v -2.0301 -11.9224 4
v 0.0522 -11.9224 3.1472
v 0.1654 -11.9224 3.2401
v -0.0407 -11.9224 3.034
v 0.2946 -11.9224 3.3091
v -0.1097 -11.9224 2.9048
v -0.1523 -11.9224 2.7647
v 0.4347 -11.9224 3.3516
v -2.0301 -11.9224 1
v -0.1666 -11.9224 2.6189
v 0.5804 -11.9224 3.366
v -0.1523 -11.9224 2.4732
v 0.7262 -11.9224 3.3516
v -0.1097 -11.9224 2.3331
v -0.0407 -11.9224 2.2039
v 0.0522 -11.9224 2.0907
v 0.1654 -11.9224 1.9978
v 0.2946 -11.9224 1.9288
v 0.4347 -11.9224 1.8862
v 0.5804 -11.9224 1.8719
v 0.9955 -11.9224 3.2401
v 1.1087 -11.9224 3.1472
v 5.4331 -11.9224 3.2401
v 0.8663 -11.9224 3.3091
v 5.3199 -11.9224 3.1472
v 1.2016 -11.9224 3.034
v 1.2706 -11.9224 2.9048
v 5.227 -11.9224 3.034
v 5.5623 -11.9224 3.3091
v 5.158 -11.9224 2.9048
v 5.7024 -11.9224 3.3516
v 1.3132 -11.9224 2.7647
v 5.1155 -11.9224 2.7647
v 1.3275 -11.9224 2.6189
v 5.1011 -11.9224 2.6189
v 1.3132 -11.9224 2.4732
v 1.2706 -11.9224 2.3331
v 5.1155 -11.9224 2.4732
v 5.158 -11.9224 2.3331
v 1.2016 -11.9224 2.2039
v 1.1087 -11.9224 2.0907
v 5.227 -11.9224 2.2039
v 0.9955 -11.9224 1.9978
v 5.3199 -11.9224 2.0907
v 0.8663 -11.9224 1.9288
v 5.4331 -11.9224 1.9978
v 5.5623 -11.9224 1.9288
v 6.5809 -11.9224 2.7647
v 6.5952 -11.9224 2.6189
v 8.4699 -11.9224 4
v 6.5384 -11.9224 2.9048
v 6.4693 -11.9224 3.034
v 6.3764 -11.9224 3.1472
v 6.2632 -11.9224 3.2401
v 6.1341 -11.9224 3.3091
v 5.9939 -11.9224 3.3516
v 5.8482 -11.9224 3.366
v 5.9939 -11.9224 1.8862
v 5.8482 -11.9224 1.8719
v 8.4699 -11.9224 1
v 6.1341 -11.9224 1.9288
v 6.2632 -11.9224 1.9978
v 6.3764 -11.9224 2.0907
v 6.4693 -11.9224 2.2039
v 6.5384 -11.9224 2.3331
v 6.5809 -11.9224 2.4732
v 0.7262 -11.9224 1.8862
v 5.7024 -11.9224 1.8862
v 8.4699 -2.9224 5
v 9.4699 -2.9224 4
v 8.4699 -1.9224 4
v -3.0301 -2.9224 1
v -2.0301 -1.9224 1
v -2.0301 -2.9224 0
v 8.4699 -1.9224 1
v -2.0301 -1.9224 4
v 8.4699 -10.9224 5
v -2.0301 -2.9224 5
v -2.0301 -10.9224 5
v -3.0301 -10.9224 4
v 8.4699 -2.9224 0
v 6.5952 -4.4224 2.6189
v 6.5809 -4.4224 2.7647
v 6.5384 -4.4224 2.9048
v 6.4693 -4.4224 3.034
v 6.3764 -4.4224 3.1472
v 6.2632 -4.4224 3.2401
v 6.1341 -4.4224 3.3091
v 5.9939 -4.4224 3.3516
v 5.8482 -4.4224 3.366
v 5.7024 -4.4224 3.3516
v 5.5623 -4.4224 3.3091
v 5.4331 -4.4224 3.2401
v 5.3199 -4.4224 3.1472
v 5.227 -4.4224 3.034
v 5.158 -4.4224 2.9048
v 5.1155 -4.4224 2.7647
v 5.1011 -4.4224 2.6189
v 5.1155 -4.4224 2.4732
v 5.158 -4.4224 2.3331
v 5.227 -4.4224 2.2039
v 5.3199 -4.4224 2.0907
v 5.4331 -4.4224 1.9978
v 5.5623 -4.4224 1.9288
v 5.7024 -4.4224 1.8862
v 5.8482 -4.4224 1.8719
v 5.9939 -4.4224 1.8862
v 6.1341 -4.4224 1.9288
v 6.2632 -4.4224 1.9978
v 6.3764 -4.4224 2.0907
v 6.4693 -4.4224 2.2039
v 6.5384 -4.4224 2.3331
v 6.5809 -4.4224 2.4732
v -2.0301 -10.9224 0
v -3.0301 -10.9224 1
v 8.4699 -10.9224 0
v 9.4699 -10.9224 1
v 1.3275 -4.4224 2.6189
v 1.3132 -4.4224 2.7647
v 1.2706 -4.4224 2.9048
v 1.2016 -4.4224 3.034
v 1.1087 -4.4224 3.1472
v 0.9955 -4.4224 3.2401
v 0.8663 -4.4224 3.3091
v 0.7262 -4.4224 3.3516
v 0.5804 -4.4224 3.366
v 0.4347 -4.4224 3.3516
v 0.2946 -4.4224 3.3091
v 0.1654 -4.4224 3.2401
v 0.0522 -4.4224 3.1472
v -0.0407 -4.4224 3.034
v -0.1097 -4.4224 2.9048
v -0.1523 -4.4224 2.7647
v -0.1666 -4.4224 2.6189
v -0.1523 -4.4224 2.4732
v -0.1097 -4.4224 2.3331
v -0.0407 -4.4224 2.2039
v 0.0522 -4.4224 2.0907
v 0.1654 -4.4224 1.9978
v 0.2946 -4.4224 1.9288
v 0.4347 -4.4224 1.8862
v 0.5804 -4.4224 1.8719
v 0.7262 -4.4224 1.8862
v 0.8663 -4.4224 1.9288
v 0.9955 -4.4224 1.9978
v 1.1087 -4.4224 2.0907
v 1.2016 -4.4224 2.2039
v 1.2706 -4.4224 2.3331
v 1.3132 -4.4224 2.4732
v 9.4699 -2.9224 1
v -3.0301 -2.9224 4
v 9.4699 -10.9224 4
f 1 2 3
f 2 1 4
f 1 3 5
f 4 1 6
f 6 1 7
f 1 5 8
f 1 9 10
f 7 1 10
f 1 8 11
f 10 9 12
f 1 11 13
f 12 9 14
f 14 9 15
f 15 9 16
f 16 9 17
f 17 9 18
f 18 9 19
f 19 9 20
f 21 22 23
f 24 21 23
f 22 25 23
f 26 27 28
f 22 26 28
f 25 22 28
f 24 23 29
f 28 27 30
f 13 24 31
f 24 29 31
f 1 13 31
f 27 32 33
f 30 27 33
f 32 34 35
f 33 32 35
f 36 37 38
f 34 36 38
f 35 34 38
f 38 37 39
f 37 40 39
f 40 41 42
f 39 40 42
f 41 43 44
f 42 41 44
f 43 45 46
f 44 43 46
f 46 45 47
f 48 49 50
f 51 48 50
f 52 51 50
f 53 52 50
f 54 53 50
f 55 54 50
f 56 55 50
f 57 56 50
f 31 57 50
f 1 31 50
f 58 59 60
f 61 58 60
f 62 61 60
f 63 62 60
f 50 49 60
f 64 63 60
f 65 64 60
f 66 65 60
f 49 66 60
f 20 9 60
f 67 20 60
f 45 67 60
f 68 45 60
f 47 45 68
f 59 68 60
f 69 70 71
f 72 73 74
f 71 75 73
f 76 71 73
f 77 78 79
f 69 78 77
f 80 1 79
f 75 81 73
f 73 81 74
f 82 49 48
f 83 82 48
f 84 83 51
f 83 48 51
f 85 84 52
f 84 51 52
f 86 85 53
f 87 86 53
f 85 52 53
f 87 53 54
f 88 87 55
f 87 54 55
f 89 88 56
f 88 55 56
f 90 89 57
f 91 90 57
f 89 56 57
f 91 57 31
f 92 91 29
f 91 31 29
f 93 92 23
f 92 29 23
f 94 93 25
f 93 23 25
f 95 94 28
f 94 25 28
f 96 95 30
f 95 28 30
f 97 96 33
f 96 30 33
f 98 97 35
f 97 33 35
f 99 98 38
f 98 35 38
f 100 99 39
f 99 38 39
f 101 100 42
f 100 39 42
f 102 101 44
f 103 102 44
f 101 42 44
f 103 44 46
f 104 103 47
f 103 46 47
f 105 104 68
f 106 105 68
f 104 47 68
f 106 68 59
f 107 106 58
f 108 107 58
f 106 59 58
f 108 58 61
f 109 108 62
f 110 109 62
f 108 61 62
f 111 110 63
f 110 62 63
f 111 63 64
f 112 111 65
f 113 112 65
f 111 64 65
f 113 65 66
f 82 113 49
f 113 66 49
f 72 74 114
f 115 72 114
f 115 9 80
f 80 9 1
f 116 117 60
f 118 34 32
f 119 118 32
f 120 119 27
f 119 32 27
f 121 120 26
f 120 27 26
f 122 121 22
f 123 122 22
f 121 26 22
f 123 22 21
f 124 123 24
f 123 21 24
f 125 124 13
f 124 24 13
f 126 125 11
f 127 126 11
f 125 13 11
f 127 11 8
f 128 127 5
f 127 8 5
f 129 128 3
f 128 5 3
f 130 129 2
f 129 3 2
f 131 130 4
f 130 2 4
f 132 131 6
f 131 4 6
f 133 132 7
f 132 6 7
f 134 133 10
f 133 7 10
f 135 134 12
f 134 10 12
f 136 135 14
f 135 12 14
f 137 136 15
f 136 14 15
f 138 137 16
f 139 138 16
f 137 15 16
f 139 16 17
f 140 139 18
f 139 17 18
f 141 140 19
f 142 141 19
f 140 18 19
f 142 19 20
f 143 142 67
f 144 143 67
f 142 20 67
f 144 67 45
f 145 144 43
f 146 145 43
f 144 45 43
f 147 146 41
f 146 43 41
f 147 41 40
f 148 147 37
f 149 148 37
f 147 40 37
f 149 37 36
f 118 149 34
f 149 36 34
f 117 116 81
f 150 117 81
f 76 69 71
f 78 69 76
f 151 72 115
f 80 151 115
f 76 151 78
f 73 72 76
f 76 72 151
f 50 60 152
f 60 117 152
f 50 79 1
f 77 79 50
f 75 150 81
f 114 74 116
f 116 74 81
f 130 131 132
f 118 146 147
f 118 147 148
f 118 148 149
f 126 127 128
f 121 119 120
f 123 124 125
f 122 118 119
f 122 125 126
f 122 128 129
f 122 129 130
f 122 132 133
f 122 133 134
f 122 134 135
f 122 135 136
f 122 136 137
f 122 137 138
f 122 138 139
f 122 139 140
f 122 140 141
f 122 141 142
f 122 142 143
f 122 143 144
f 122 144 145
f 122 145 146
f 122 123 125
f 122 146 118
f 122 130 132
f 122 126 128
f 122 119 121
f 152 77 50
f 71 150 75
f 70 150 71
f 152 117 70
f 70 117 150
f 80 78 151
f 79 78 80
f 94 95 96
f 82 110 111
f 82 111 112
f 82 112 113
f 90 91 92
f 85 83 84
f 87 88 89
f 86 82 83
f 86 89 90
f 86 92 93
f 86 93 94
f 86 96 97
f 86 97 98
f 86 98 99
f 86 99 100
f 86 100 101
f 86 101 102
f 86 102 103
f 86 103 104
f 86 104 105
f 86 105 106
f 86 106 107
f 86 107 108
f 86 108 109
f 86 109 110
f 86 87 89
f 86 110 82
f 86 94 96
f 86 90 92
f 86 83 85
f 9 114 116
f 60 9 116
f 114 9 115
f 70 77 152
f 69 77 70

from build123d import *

# Parameters (mm, degrees)
F1_DEPTH = 5
F3_SIZE  = 1
F4_R     = 0.7470588235
F5_DEPTH = 7.5


# Not quite as in the source:
# - a feature names something its author has since deleted; it is built from what else it names


with BuildPart() as f1:
    # F0 (on Top) → F1 (new body)
    with BuildSketch(Plane.XY):
        Polygon((9.4699421152, -1.9223576039), (-3.0300578848, -1.9223576039), (-3.0300578848, -6.9223576039), (-3.0300578848, -11.9223576039), (9.4699421152, -11.9223576039), align=None)
    extrude(amount=F1_DEPTH)

    # F3
    f3_edges = [f1.edges().sort_by_distance(p)[0] for p in [
        (3.219942, -11.922358, 5),
        (9.469942, -6.922358, 5),
        (-3.030058, -1.922358, 2.5),
        (-3.030058, -11.922358, 2.5),
        (9.469942, -11.922358, 2.5),
        (9.469942, -6.922358, 0),
        (3.219942, -11.922358, 0),
        (9.469942, -1.922358, 2.5),
        (-3.030058, -6.922358, 5),
        (3.219942, -1.922358, 5),
        (3.219942, -1.922358, 0),
        (-3.030058, -6.922358, 0),
    ]]
    chamfer(f3_edges, length=F3_SIZE)

    # F4 (on face) → F5 (cut)
    with BuildSketch(Plane.XZ.offset(11.9223576039)):
        with Locations((0.5804465618, 2.6189445052)):
            Circle(F4_R)
        with Locations((5.8481891174, 2.6189445052)):
            Circle(F4_R)
    extrude(amount=-F5_DEPTH, mode=Mode.SUBTRACT)


solid = f1.part
